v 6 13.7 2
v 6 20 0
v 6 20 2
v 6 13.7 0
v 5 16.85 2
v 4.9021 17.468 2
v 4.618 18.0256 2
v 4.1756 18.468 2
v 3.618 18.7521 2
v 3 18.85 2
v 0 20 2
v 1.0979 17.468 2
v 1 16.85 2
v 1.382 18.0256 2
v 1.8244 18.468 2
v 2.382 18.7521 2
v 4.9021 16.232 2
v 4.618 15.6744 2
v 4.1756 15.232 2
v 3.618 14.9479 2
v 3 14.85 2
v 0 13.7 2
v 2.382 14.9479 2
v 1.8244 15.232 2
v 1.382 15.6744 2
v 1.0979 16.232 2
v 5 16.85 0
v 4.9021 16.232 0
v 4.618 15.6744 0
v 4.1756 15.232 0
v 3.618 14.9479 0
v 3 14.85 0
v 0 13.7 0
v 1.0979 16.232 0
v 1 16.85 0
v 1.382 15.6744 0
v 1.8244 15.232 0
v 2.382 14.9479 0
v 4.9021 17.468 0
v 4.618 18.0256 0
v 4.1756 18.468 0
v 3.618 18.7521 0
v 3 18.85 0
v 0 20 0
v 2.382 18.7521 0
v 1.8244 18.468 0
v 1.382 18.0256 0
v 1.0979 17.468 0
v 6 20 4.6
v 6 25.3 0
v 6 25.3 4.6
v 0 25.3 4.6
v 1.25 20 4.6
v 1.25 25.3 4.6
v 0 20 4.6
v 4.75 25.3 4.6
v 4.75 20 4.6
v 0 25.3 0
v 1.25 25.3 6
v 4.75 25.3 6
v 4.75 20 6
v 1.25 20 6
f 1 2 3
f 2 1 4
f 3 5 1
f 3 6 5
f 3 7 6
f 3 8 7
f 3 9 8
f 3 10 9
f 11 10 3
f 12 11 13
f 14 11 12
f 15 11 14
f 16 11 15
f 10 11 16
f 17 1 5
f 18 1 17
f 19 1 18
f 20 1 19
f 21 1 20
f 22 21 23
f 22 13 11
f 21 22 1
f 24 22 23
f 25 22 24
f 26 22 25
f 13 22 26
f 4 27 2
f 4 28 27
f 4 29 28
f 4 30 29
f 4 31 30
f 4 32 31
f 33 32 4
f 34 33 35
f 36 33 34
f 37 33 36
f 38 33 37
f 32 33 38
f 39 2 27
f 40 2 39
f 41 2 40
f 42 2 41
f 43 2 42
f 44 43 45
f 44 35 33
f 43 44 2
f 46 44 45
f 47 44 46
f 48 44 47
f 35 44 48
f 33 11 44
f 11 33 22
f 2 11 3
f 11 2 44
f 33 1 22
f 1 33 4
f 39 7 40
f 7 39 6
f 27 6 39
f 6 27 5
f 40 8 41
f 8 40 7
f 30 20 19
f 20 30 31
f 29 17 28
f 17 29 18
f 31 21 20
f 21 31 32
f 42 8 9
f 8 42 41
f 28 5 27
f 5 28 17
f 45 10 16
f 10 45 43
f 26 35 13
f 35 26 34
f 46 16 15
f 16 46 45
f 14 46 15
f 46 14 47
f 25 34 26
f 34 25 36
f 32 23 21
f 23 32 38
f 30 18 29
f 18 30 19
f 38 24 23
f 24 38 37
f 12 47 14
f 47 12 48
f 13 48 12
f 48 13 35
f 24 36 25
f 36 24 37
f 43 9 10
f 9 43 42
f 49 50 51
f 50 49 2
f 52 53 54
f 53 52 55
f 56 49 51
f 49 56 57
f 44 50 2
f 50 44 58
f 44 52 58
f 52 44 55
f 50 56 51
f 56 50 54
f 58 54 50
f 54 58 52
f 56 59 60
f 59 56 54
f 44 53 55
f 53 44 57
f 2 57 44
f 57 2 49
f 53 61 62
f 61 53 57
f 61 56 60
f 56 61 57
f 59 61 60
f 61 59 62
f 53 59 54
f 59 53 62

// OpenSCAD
// file: joystick_4_way_hat_mk1.scad
/*
	OpenJoystick - A project creating affordable, open source, 3D-printable custom flight-sim joysticks for everyone
	Copyright (C) 2012 Travis John Howse

	This program is free software: you can redistribute it and/or modify
	it under the terms of the GNU General Public License as published by
	the Free Software Foundation, either version 3 of the License, or
	(at your option) any later version.

	This program is distributed in the hope that it will be useful,
	but WITHOUT ANY WARRANTY; without even the implied warranty of
	MERCHANTABILITY or FITNESS FOR A PARTICULAR PURPOSE.  See the
	GNU General Public License for more details.

	You should have received a copy of the GNU General Public License
	along with this program.  If not, see <http://www.gnu.org/licenses/>.
*/

include <joystick_defines.scad>

// See joystick_defines for most of the guts.

//translate([0,0,10])
//	4_way_hat_washer();
//translate([0,0,13])
//	switch_hat_saddle();
//  switch_hat_hanoi();
//pb(1);

module hat_base(numDirs)
{
	difference()
	{
		cylinder(r=(4_way_hat_base_dia/2), h=4_way_hat_base_z, $fn=circle_faces);
		
		translate([0,pb_total_z+(4_way_hat_base_screw_dia/2),4_way_hat_base_z-pb_xy/2+zff])
			rotate([90,0,0])
				pb(1.02,0);
		translate([0,-pb_total_z-(4_way_hat_base_screw_dia/2),4_way_hat_base_z-pb_xy/2+zff])
			rotate([-90,180,0])
				pb(1.02,0);
		if (numDirs==4)
		{
			translate([pb_total_z+(4_way_hat_base_screw_dia/2),0,4_way_hat_base_z-pb_xy/2+zff])
				rotate([90,0,-90])
					pb(1.02,0);
			translate([-pb_total_z-(4_way_hat_base_screw_dia/2),0,4_way_hat_base_z-pb_xy/2+zff])
				rotate([-90,180,-90])
					pb(1.02,0);
//			// Now chop the bit out of the middle
			translate([0,0,4_way_hat_base_base_z+zff])
				//cube([4_way_hat_base_screw_dia+2*pb_btn_z+zff,4_way_hat_base_screw_dia+2*pb_btn_z+zff,10],center=true);
                cylinder(r=sqrt(pow((pb_btn_dia/2),2) + pow((4_way_hat_base_screw_dia/2+pb_btn_z),2)),h=10,$fn=circle_faces);
		} else	{
			// Now chop the bit out of the middle
			translate([0,0,4_way_hat_base_base_z+5])
				cube([4_way_hat_base_screw_dia,4_way_hat_base_screw_dia+2*pb_btn_z+zff,10],center=true);
		}

		// Now chop the bit out of the middle
		/*translate([0,0,4_way_hat_base_base_z+5])
			cube([pb_xy+zff,pb_xy+zff,10],center=true);*/

		// Screw
		translate([0,0,-1])
            union()
            {
                rotate([0,5,0]) cylinder(r=4_way_hat_base_screw_dia/2, h=4_way_hat_base_z*1, $fn=circle_faces);
                rotate([0,-5,0]) cylinder(r=4_way_hat_base_screw_dia/2, h=4_way_hat_base_z*1, $fn=circle_faces);
                rotate([5,0,0]) cylinder(r=4_way_hat_base_screw_dia/2, h=4_way_hat_base_z*1, $fn=circle_faces);
                rotate([-5,0,0]) cylinder(r=4_way_hat_base_screw_dia/2, h=4_way_hat_base_z*1, $fn=circle_faces);
                cylinder(r=4_way_hat_base_screw_dia/2, h=4_way_hat_base_z*1, $fn=circle_faces);
            }
	}		
}

module hat_voids(numDirs)
{
	difference()
	{
		cylinder(r=4_way_hat_base_dia/2, h=4_way_hat_base_z);		
		hat_base(numDirs);
	}
}

module switch_hat_saddle()
{
	step_size = 2; // Won't really work for anything other than 2, sorry.
	num_steps = 4_way_hat_base_dia / step_size;
	switch_hat_saddle_base_depth = 4_way_hat_peg_stem_hole_z;


	union()
	{
		translate([0,0,switch_hat_saddle_base_depth])
			intersection()
			{
				cylinder(r = (4_way_hat_base_dia/2), h = 10, $fn=circle_faces);
				for (n = [0:num_steps])
				{
					translate([-(4_way_hat_base_dia/2)+n*step_size+0.25*step_size,0,0])
						cube([step_size, 4_way_hat_base_dia, abs((num_steps/2)-n)*1.5],center=true);
				}
			}
		difference()
		{
			cylinder(r = (4_way_hat_base_dia/2), h = switch_hat_saddle_base_depth, $fn=circle_faces);
			translate([0,0,-zff])
				#cylinder(r=(4_way_hat_base_screw_dia/2), h =switch_hat_saddle_base_depth, $fn=circle_faces);
		}
	}
}

module switch_hat_hanoi()
{
	
	difference()
	{
		union()
		{
			cylinder(r = (4_way_hat_base_dia/2), h = 2, $fn=circle_faces);
			translate([0,0,2])
			{
				for (n = [1:8])
				{
					cylinder(r = (4_way_hat_base_dia/2 - (n-1)), h = n*0.7, $fn=circle_faces);
				}
			}
		}
		translate([0,0,-zff])
			cylinder(r=(4_way_hat_base_screw_dia/2), h = 4_way_hat_peg_stem_hole_z, $fn=circle_faces);
	}	
}

module 4_way_hat_washer()
{
	difference()
	{
		cylinder(r=(4_way_hat_base_dia/2), h = 1, $fn=circle_faces);
		translate([0,0,-zff])
			cylinder(r=(4_way_hat_base_screw_dia/2), h = 1+2*zff, $fn=circle_faces);
	}
}

module hat_stem(height)
{
	bolt(8.5/2, 1.5, 4.5/2, height,0);
}
	
//hat_stem(11); // Face hats
hat_stem(23); // CMS
//switch_hat_hanoi();
// file: joystick_defines.scad
/*
	OpenJoystick - A project creating affordable, open source, 3D-printable custom flight-sim joysticks for everyone
	Copyright (C) 2012 Travis John Howse

	This program is free software: you can redistribute it and/or modify
	it under the terms of the GNU General Public License as published by
	the Free Software Foundation, either version 3 of the License, or
	(at your option) any later version.

	This program is distributed in the hope that it will be useful,
	but WITHOUT ANY WARRANTY; without even the implied warranty of
	MERCHANTABILITY or FITNESS FOR A PARTICULAR PURPOSE.  See the
	GNU General Public License for more details.

	You should have received a copy of the GNU General Public License
	along with this program.  If not, see <http://www.gnu.org/licenses/>.
*/

// Standard skate bearing
bearing_inside_dia = 8;
bearing_outside_dia = 22;
bearing_thickness = 7;

// Arbitrary value
shaft_dia = 16;

zff = 0.005;

extrusion_width = 0.8; // Used for single-wall support.

// Set this to 1 to translate everything to printable mode
printable_mode = 0;

// Gimbal core block sizes 
gimbal_core_x = 50;
gimbal_core_y = 30;
gimbal_core_z = gimbal_core_y;

// Gimbal frame sizes 
gimbal_frame_thickness = 10; 

circle_faces = 20;
$fn=circle_faces;

// The 1.8 is 2sin(45)ish, the maximum y on the xy plane the core can occupy
gimbal_frame_x = gimbal_core_x+2*gimbal_frame_thickness+2; // 2mm for washers
gimbal_frame_y = (gimbal_core_y * 1.8)+gimbal_frame_thickness;

// Frame is big enough to stop the core colliding at 45 degree rotation.
gimbal_frame_z = sqrt(pow(gimbal_core_z,2)/2) * 2 + 2; // 2 fudge to allow for clearance at tips.

max_angle = 45; // Not much comes off this, should probably build it in more places.

module bearing(hole,outer_puff)
{
	difference()
	{
		cylinder(h=bearing_thickness, r = (bearing_outside_dia/2)+outer_puff);

		if (hole)
		{
			translate([0,0,-zff])
				cylinder(h=9, r = (bearing_inside_dia/2));
		}
	}
}

// Hat sizes
// Note that many other settings for the hats are in their own .scad, only stuff relevant to the rest of the stick is here.
pb_xy = 6;
pb_z = 4; // Height minus pushbutton
pb_btn_z = 1;
pb_total_z = pb_z+pb_btn_z;
pb_btn_dia = 3.5;
pb_leg_x = 4;
pb_leg_y = 5;
pb_leg_z = 0.7;

lever_switch_x = 12.85;
lever_switch_y = 6.5;
lever_switch_z = 5.8;

4_way_hat_base_dia = 18;
4_way_hat_base_base_z = 1.5; // Base thickness
4_way_hat_base_z = pb_xy + 4_way_hat_base_base_z;
4_way_hat_base_screw_dia = 5;
4_way_hat_base_screw_head_dia = 8.25;
4_way_hat_base_screw_head_thk = 3;
4_way_hat_wire_gap = 3;
4_way_hat_cutout_z = 4_way_hat_base_z + 4_way_hat_base_screw_head_thk;

4_way_hat_peg_stem_hole_z = 4;

// Grip sizes
grip_height = 100;
grip_diameter = 44;
grip_clip = 33;
grip_rest_thickness = 5;
grip_rest_diameter = 80;
grip_cms_height_offset = 50;
grip_cms_offset = -5;
grip_cms_angle = 30;
grip_cms_stub_length = 40;
grip_cms_stub_diameter = 4_way_hat_base_dia;
grip_cms_twist = 15;

grip_head_offset_x = -10;
grip_head_box_x = 4_way_hat_base_dia * 2.5;
grip_head_box_y = 4_way_hat_base_dia * 2.2;
grip_head_box_z = 4_way_hat_base_dia * 2;

joystick_head_trigger_thickness = pb_xy;

my_layer_thickness = 0.35;

joystick_big_btn_height = 8;
joystick_big_btn_diameter = 8.0;
joystick_big_btn_clippyness = 3;

headbolt_x = 10.8;
headbolt_y = -9;
headbolt_z = -11;
headbolt_extra = 8;

module hat_cutout(bloat)
{
	// Very similar to a hat, but it has a cross on the bottom and a peg to indicate where the cables will be run.
	translate([0,0,-4_way_hat_wire_gap-4_way_hat_base_z])
	union()
	{
		translate([0,0,4_way_hat_wire_gap])cylinder(r=(4_way_hat_base_dia/2)*bloat,h=4_way_hat_base_z);
		
		intersection()
		{
			cylinder(r=(4_way_hat_base_dia/2)*bloat,h=4_way_hat_base_z);
			union()
			{
				cube([100, pb_xy, 10],true);
				cube([pb_xy, 100, 10],true);
			}
		}
		translate([0,0,-4_way_hat_base_screw_head_thk+4_way_hat_wire_gap]) cylinder(r=(4_way_hat_base_screw_head_dia/2),h=4_way_hat_base_screw_head_thk,$fn=circle_faces);
	}
}

module pb(puff, legdir)
{
	translate([0,0,pb_z/2])
	{
		// Puff set to 1 if you want a realistic model of a button.
		// Puff variable used for making holes in things bigger than the button size
		cube([pb_xy*puff,pb_xy*puff,pb_z*puff],center=true);
	
		// Button knob itself
		translate([0,0,pb_z/2-zff])
			cylinder(r=(pb_btn_dia/2),h=pb_btn_z,$fn=circle_faces);
	
		// Button legs
		if (legdir == 0)
		{
			translate([0,-pb_xy/2-pb_leg_y/2+zff,-pb_z/2+pb_leg_z/2+0.8])
				cube([pb_xy,pb_leg_y,pb_leg_z],center=true);
		} else {
			translate([0,-pb_xy/2+pb_leg_z/2+zff-pb_leg_z,-pb_z/2-pb_leg_y/2+0.8])
				cube([pb_xy,pb_leg_z,pb_leg_y],center=true);
		}
	}

}

module bolt(cap_r, cap_z, shaft_r, shaft_z,slot_len)
{
	// Hex head bolt for holding head together
	if (shaft_z <= slot_len)
	{
		echo("NO! Don't make the threaded length the same as the total.");
	}
	union()
	{
		cylinder(r=cap_r,h=cap_z);
		translate([0,0,cap_z]) cylinder(r=shaft_r+0.15, h=slot_len);
		translate([0,0,cap_z+slot_len]) cylinder(r=shaft_r, h=shaft_z-slot_len);
	}
}

module fillet(radius, length)
{
	translate([-zff,0,-zff]) difference()
	{
		cube([radius,length,radius]);
		translate([radius,length+zff,radius]) rotate([90,0,0]) cylinder(r=radius,h=length+2*zff);
	}
}
// main file
/*
	OpenJoystick - A project creating affordable, open source, 3D-printable custom flight-sim joysticks for everyone
	Copyright (C) 2012 Travis John Howse

	This program is free software: you can redistribute it and/or modify
	it under the terms of the GNU General Public License as published by
	the Free Software Foundation, either version 3 of the License, or
	(at your option) any later version.

	This program is distributed in the hope that it will be useful,
	but WITHOUT ANY WARRANTY; without even the implied warranty of
	MERCHANTABILITY or FITNESS FOR A PARTICULAR PURPOSE.  See the
	GNU General Public License for more details.

	You should have received a copy of the GNU General Public License
	along with this program.  If not, see <http://www.gnu.org/licenses/>.
*/

include <joystick_defines.scad>
use <joystick_4_way_hat_mk1.scad>
use <joystick_head.scad>

big_cms_stem_support_z = 2.9;

module joystick_handle()
{
	trigger_cutout_z = 20;
	trigger_cutout_x = 6.7;
	peg_offset_z = 5;
	head_offset_x = -3;
	
	mirror([0,left_handed,0]) union()
	{
		difference()
		{
			union()
			{
				translate([0,0,grip_rest_thickness])
					difference()
					{
						scale([1,0.7,1]) cylinder(h = grip_height, r = (grip_diameter/2));
						//translate([-15,0,90]) rotate([0,-45,0]) translate([0,0,-50]) scale([1,0.7,1]) cylinder(h = grip_height, r = (grip_diameter/2));
						//translate([0,0,grip_height/2])cube([grip_diameter,grip_clip,grip_height],true); 
						translate([head_offset_x-4.5,0,grip_height]) rotate([0,-20,0]) translate([0,0,-50]) difference()
						{
							translate([0,-50,0]) cube([100,100,100]);
							scale([1,0.7,1]) cylinder(h = grip_height, r = (grip_diameter/2));
						}
					}
				translate([10,10,0]) scale([1.2,1,1]) cylinder(h = grip_rest_thickness, r = (grip_rest_diameter / 2));
				//translate([peg_offset_x,0,grip_height-peg_offset_z]) cylinder(h = peg_height, r = (shaft_dia/2));
				}
			// Subtract hole through centre.
			translate([0,0,-zff])
				cylinder(h = (grip_height + grip_rest_thickness+ 2 * zff), r = (shaft_dia/2));
			
			translate([0,grip_cms_offset,grip_height-grip_cms_height_offset]) // I should be more clever about this.
					rotate([grip_cms_angle,0,0])
					union()
					{
						scale([1.05,1.05,0]) cms_stem(1);
						//%cms_stem(0);
					}			
				
			//translate([0,0,grip_height+23.5]) rotate([0,0,90]) joystick_head_sidecuts();
			//translate([0,0,grip_height]) rotate([0,0,90]) #joystick_handle_sidecuts();
			translate([head_offset_x-2,0,grip_height+23.5]) rotate([0,0,90]) joystick_handle_sidecuts();
			
			rotate([0,0,90])translate([headbolt_x,headbolt_y-head_offset_x+3,headbolt_z+headbolt_extra+grip_height+21.5]) rotate([180,0,0]) bolt(3,3+headbolt_extra,1.45,20,0);
			rotate([0,0,90])translate([-headbolt_x,headbolt_y-head_offset_x+3,headbolt_z+headbolt_extra+grip_height+21.5]) rotate([180,0,0]) bolt(3,3+headbolt_extra,1.45,20,0);
					
			// Trigger cutout
			/*translate([-(grip_diameter/2),0,grip_height-trigger_cutout_z+10]) union()
			{
				cylinder(r=trigger_cutout_x/2+1,h=trigger_cutout_z);
				translate([1,0,trigger_cutout_z/2]) cube([trigger_cutout_x,trigger_cutout_x,trigger_cutout_z],true);
			}*/
			translate([22,0,10]) rotate([0,-90,0]) bolt(3,13,1.45,20,0);
		}
		translate([0,0,grip_height-peg_offset_z]) joystick_handle_peg(1);
		
		
		//translate([head_offset_x-3,0,grip_height+22.6]) rotate([0,0,90]) joystick_head_with_boltholes(0);
		translate([0,grip_cms_offset,grip_height-grip_cms_height_offset]) rotate([grip_cms_angle,0,0]) cms_stem(0);
	}
	//translate([head_offset_x-3,0,grip_height+22.6]) rotate([0,0,90]) import("joystick_head.stl");
	//translate([head_offset_x-3,0,grip_height+22.6]) rotate([0,0,90]) import("joystick_head_noface.stl");
}

module joystick_handle_parts(half)
{
	// half = 0 - All
	// half = 1 - Bottom
	// half = 2 - Top
	
	split_z = 40;
	extra_bolt = 15;
	thread_len = 10;
	peg_offset_z = 5;
	
	difference()
	{
		joystick_handle();
		if (half == 1)
		{
			translate([-100,-100,split_z]) cube([200,200,100]);
		} else if (half == 2)
		{
			translate([-100,-100,split_z-100]) cube([200,200,100]);
		}
		
		// Perfectly functional, but you can't reach the bolt heads easily.
		//translate([20,0,split_z-12]) rotate([0,-30,0]) translate([0,0,-extra_bolt+2]) #bolt(3,3+extra_bolt,1.45,20,thread_len);
		//rotate([0,0,180]) translate([20,0,split_z-12]) rotate([0,-30,0]) translate([0,0,-extra_bolt+2]) #bolt(3,3+extra_bolt,1.45,20,thread_len);
		
		translate([20,0,split_z+12]) rotate([0,210,0]) translate([0,0,-extra_bolt+2]) bolt(3,3+extra_bolt,1.45,20,thread_len);
		rotate([0,0,180]) translate([20,0,split_z+12]) rotate([0,210,0]) translate([0,0,-extra_bolt+2]) bolt(3,3+extra_bolt,1.45,20,thread_len);
	}
	
	if (half == 1)
	{
		//translate([0,0,split_z-peg_offset_z-2]) joystick_handle_peg(1);
	}
}

module joystick_handle_peg(support)
{
	peg_height = 14;
	support_width = shaft_dia;
	
	difference()
	{
		union()
		{
			cylinder(h = peg_height, r = (shaft_dia/2));
			if (support)
			{	
				translate([-extrusion_width/2-(shaft_dia/2)+4.9,-support_width/2,-3]) cube([extrusion_width,support_width,3]);
				translate([-extrusion_width/2+(shaft_dia/2)-4.9,-support_width/2,-3]) cube([extrusion_width,support_width,3]);
			}
		}
		union()
		{
			translate([(shaft_dia/2)-2,0,peg_height/2]) cube([5,5,peg_height*2],true);
			translate([(-shaft_dia/2)+2,0,peg_height/2]) cube([5,5,peg_height*2],true);
			translate([0,0,-0.5]) cylinder(r=0.5,h=peg_height);
		}
	}
}

module joystick_handle_sidecuts()
{
	// Mostly copied from joystick_head_sidecuts()
/*	side_cut_y = -17;	
	side_cut_z = 30;
	side_cut_z_scale = 1.5;
	union()
	{
		translate([-20,side_cut_y,-50]) rotate([-45,0,0]) scale([0.6,1,side_cut_z_scale]) translate([0,0,side_cut_z]) sphere(r=20);
	}
	union()
	{
		translate([20,side_cut_y,-50]) rotate([-45,0,0]) scale([0.6,1,side_cut_z_scale]) translate([0,0,side_cut_z]) sphere(r=20);
	}*/
	
	side_cut_x = 18.7;
	side_cut_y = 18.5;
	//side_cut_z = 20;
	side_cut_z = 33;
	side_cut_x_scale = 0.54;
	side_cut_y_scale = 1.38;
	//side_cut_z_scale = 1.5;
	side_cut_z_scale = 1;
	union()
	{
		translate([-side_cut_x,side_cut_y,-50]) scale([side_cut_x_scale,side_cut_y_scale,side_cut_z_scale]) translate([0,0,side_cut_z]) sphere(r=20);
	}
	union()
	{
		translate([side_cut_x,side_cut_y,-50]) scale([side_cut_x_scale,side_cut_y_scale,side_cut_z_scale]) translate([0,0,side_cut_z]) sphere(r=20);
	}
	
	
}
module cms_stem(bolt)
{
	bolt_x = -22;
	bolt_y = grip_cms_stub_diameter/4+1.3;
	bolt_z = 18;
	
	baseplug_z = pb_z+1;
	
	pb_puff = 1.05;
	pb_xy_puff = pb_xy*pb_puff;
	pb_z_puff = pb_z*pb_puff;
	

	//grip_cms_twist = 20;
	if (bolt)
	{
		cylinder(h = grip_cms_stub_length, r = (grip_cms_stub_diameter/2));
		translate([bolt_x,bolt_y,bolt_z]) rotate([0,90,0]) bolt(3,3+10,1.45,20,17);
	} else
	{
		difference()
		{
			union()
			{
				difference()
				{
					cylinder(h = grip_cms_stub_length, r = (grip_cms_stub_diameter/2));
					translate([0,0,grip_cms_stub_length-4_way_hat_base_z+zff]) rotate([0,0,grip_cms_twist]) hat_voids(4);
					translate([0,0,-zff+baseplug_z]) cylinder(r = grip_cms_stub_diameter/2-1.6,h = grip_cms_stub_length-4_way_hat_base_z+3*zff-baseplug_z);
					translate([0,0,-zff]) cylinder(r = 2.25, h = baseplug_z+zff);
					
					translate([-pb_xy_puff/2,-pb_xy_puff/2,1]) cube([pb_xy_puff,20,pb_z_puff]);
					
				}
				translate([0,0,1]) rotate([0,0,180]) scale([1,1,1]) pb(1.1, 0);
				// Support material experiment
				rotate([0,0,grip_cms_twist])
				{
					//cms_stem_support(0.74);
					cms_stem_support(big_cms_stem_support_z);
					//rotate([0,0,90]) cms_stem_support(0.77);
					rotate([0,0,90]) cms_stem_support(1.7);
				}
			}
			translate([bolt_x,bolt_y,bolt_z]) rotate([0,90,0]) bolt(3,3+10,1.45,20,17);
			translate([0,(grip_cms_stub_diameter/2)-1.6,baseplug_z]) rotate([0,0,0]) scale([1.1,1.1,1.1]) hull(){cms_hat_stem(0);}
		}
	}
}

module cms_stem_retainer()
{
	guide_z = 2;
	wire_clearance = 1.4;
	wire_gap = 3.5;
	pb_puff = 1.05;
	
	cube([pb_xy,pb_xy*pb_puff-1,pb_z+guide_z-wire_clearance]);
	translate([(pb_xy-wire_gap)/2,0,pb_z+guide_z-wire_clearance]) cube([wire_gap,pb_xy*pb_puff-1,wire_clearance]);
	translate([0,-pb_xy*pb_puff,0]) difference()
	{
		cube([pb_xy,pb_xy*pb_puff,guide_z]);
		translate([pb_xy/2,pb_xy*pb_puff/2,0]) cylinder(r=2,h=10);
	}
}

module cms_stem_support(support_z)
{
	support_x = 3.2;
	support_thickness = extrusion_width; // My extrusion width.
	//support_start_z = 0.75;
	//support_z = (1-support_start_z)*grip_cms_stub_length-4_way_hat_base_z;

	//translate([support_x,0,(grip_cms_stub_length*support_start_z-4_way_hat_base_z)]) cube([support_thickness,4_way_hat_base_dia*0.8,(grip_cms_stub_length*support_start_z-4_way_hat_base_z)],true);
	//translate([-support_x,0,(grip_cms_stub_length*support_start_z-4_way_hat_base_z)]) cube([support_thickness,4_way_hat_base_dia*0.8,(grip_cms_stub_length*support_start_z-4_way_hat_base_z)],true);
	translate([-support_x-support_thickness/2,-(4_way_hat_base_dia*0.8/2),grip_cms_stub_length-4_way_hat_base_z-support_z])
		cube([support_thickness,4_way_hat_base_dia*0.8,support_z]);
	translate([support_x-support_thickness/2,-(4_way_hat_base_dia*0.8/2),grip_cms_stub_length-4_way_hat_base_z-support_z])
		cube([support_thickness,4_way_hat_base_dia*0.8,support_z]);
	
}

module cms_hat_stem(hole)
{
	//height = 15;
	socket_z = 5;
	height = 4_way_hat_base_z+big_cms_stem_support_z+4_way_hat_peg_stem_hole_z;
	//bolt(8.5/2, 1.5, 4.5/2, height,0);
	difference()
	{
		cylinder(r=8.5/2,h=1.5+socket_z);
		if(hole)
		{
			cylinder(r=1.55,h=socket_z);
		}
	}
	translate([0,0,1.5+socket_z-zff]) cylinder(r=4.5/2, h=height);
}

//%cube([100,100,220],true);

//left_handed = 0;
//joystick_handle();
//cms_stem(0);
//rotate([0,180,0]) translate([-pb_xy/2,2.5,-7]) %cms_stem_retainer();

translate([0,20,0]) cms_stem_retainer();
//translate([pb_xy/2,17,7]) rotate([180,0,0]) pb(1.1, 0);
//translate([0,0,23]) cms_hat_stem(1);

//cms_hat_stem(1);

//switch_hat_saddle();
//joystick_handle_parts(2);
//joystick_handle_parts(1);
//joystick_handle_peg();

//joystick_handle_sidecuts();
//%joystick_head_sidecuts();
//translate([50,50,0]) cms_stem(0);
